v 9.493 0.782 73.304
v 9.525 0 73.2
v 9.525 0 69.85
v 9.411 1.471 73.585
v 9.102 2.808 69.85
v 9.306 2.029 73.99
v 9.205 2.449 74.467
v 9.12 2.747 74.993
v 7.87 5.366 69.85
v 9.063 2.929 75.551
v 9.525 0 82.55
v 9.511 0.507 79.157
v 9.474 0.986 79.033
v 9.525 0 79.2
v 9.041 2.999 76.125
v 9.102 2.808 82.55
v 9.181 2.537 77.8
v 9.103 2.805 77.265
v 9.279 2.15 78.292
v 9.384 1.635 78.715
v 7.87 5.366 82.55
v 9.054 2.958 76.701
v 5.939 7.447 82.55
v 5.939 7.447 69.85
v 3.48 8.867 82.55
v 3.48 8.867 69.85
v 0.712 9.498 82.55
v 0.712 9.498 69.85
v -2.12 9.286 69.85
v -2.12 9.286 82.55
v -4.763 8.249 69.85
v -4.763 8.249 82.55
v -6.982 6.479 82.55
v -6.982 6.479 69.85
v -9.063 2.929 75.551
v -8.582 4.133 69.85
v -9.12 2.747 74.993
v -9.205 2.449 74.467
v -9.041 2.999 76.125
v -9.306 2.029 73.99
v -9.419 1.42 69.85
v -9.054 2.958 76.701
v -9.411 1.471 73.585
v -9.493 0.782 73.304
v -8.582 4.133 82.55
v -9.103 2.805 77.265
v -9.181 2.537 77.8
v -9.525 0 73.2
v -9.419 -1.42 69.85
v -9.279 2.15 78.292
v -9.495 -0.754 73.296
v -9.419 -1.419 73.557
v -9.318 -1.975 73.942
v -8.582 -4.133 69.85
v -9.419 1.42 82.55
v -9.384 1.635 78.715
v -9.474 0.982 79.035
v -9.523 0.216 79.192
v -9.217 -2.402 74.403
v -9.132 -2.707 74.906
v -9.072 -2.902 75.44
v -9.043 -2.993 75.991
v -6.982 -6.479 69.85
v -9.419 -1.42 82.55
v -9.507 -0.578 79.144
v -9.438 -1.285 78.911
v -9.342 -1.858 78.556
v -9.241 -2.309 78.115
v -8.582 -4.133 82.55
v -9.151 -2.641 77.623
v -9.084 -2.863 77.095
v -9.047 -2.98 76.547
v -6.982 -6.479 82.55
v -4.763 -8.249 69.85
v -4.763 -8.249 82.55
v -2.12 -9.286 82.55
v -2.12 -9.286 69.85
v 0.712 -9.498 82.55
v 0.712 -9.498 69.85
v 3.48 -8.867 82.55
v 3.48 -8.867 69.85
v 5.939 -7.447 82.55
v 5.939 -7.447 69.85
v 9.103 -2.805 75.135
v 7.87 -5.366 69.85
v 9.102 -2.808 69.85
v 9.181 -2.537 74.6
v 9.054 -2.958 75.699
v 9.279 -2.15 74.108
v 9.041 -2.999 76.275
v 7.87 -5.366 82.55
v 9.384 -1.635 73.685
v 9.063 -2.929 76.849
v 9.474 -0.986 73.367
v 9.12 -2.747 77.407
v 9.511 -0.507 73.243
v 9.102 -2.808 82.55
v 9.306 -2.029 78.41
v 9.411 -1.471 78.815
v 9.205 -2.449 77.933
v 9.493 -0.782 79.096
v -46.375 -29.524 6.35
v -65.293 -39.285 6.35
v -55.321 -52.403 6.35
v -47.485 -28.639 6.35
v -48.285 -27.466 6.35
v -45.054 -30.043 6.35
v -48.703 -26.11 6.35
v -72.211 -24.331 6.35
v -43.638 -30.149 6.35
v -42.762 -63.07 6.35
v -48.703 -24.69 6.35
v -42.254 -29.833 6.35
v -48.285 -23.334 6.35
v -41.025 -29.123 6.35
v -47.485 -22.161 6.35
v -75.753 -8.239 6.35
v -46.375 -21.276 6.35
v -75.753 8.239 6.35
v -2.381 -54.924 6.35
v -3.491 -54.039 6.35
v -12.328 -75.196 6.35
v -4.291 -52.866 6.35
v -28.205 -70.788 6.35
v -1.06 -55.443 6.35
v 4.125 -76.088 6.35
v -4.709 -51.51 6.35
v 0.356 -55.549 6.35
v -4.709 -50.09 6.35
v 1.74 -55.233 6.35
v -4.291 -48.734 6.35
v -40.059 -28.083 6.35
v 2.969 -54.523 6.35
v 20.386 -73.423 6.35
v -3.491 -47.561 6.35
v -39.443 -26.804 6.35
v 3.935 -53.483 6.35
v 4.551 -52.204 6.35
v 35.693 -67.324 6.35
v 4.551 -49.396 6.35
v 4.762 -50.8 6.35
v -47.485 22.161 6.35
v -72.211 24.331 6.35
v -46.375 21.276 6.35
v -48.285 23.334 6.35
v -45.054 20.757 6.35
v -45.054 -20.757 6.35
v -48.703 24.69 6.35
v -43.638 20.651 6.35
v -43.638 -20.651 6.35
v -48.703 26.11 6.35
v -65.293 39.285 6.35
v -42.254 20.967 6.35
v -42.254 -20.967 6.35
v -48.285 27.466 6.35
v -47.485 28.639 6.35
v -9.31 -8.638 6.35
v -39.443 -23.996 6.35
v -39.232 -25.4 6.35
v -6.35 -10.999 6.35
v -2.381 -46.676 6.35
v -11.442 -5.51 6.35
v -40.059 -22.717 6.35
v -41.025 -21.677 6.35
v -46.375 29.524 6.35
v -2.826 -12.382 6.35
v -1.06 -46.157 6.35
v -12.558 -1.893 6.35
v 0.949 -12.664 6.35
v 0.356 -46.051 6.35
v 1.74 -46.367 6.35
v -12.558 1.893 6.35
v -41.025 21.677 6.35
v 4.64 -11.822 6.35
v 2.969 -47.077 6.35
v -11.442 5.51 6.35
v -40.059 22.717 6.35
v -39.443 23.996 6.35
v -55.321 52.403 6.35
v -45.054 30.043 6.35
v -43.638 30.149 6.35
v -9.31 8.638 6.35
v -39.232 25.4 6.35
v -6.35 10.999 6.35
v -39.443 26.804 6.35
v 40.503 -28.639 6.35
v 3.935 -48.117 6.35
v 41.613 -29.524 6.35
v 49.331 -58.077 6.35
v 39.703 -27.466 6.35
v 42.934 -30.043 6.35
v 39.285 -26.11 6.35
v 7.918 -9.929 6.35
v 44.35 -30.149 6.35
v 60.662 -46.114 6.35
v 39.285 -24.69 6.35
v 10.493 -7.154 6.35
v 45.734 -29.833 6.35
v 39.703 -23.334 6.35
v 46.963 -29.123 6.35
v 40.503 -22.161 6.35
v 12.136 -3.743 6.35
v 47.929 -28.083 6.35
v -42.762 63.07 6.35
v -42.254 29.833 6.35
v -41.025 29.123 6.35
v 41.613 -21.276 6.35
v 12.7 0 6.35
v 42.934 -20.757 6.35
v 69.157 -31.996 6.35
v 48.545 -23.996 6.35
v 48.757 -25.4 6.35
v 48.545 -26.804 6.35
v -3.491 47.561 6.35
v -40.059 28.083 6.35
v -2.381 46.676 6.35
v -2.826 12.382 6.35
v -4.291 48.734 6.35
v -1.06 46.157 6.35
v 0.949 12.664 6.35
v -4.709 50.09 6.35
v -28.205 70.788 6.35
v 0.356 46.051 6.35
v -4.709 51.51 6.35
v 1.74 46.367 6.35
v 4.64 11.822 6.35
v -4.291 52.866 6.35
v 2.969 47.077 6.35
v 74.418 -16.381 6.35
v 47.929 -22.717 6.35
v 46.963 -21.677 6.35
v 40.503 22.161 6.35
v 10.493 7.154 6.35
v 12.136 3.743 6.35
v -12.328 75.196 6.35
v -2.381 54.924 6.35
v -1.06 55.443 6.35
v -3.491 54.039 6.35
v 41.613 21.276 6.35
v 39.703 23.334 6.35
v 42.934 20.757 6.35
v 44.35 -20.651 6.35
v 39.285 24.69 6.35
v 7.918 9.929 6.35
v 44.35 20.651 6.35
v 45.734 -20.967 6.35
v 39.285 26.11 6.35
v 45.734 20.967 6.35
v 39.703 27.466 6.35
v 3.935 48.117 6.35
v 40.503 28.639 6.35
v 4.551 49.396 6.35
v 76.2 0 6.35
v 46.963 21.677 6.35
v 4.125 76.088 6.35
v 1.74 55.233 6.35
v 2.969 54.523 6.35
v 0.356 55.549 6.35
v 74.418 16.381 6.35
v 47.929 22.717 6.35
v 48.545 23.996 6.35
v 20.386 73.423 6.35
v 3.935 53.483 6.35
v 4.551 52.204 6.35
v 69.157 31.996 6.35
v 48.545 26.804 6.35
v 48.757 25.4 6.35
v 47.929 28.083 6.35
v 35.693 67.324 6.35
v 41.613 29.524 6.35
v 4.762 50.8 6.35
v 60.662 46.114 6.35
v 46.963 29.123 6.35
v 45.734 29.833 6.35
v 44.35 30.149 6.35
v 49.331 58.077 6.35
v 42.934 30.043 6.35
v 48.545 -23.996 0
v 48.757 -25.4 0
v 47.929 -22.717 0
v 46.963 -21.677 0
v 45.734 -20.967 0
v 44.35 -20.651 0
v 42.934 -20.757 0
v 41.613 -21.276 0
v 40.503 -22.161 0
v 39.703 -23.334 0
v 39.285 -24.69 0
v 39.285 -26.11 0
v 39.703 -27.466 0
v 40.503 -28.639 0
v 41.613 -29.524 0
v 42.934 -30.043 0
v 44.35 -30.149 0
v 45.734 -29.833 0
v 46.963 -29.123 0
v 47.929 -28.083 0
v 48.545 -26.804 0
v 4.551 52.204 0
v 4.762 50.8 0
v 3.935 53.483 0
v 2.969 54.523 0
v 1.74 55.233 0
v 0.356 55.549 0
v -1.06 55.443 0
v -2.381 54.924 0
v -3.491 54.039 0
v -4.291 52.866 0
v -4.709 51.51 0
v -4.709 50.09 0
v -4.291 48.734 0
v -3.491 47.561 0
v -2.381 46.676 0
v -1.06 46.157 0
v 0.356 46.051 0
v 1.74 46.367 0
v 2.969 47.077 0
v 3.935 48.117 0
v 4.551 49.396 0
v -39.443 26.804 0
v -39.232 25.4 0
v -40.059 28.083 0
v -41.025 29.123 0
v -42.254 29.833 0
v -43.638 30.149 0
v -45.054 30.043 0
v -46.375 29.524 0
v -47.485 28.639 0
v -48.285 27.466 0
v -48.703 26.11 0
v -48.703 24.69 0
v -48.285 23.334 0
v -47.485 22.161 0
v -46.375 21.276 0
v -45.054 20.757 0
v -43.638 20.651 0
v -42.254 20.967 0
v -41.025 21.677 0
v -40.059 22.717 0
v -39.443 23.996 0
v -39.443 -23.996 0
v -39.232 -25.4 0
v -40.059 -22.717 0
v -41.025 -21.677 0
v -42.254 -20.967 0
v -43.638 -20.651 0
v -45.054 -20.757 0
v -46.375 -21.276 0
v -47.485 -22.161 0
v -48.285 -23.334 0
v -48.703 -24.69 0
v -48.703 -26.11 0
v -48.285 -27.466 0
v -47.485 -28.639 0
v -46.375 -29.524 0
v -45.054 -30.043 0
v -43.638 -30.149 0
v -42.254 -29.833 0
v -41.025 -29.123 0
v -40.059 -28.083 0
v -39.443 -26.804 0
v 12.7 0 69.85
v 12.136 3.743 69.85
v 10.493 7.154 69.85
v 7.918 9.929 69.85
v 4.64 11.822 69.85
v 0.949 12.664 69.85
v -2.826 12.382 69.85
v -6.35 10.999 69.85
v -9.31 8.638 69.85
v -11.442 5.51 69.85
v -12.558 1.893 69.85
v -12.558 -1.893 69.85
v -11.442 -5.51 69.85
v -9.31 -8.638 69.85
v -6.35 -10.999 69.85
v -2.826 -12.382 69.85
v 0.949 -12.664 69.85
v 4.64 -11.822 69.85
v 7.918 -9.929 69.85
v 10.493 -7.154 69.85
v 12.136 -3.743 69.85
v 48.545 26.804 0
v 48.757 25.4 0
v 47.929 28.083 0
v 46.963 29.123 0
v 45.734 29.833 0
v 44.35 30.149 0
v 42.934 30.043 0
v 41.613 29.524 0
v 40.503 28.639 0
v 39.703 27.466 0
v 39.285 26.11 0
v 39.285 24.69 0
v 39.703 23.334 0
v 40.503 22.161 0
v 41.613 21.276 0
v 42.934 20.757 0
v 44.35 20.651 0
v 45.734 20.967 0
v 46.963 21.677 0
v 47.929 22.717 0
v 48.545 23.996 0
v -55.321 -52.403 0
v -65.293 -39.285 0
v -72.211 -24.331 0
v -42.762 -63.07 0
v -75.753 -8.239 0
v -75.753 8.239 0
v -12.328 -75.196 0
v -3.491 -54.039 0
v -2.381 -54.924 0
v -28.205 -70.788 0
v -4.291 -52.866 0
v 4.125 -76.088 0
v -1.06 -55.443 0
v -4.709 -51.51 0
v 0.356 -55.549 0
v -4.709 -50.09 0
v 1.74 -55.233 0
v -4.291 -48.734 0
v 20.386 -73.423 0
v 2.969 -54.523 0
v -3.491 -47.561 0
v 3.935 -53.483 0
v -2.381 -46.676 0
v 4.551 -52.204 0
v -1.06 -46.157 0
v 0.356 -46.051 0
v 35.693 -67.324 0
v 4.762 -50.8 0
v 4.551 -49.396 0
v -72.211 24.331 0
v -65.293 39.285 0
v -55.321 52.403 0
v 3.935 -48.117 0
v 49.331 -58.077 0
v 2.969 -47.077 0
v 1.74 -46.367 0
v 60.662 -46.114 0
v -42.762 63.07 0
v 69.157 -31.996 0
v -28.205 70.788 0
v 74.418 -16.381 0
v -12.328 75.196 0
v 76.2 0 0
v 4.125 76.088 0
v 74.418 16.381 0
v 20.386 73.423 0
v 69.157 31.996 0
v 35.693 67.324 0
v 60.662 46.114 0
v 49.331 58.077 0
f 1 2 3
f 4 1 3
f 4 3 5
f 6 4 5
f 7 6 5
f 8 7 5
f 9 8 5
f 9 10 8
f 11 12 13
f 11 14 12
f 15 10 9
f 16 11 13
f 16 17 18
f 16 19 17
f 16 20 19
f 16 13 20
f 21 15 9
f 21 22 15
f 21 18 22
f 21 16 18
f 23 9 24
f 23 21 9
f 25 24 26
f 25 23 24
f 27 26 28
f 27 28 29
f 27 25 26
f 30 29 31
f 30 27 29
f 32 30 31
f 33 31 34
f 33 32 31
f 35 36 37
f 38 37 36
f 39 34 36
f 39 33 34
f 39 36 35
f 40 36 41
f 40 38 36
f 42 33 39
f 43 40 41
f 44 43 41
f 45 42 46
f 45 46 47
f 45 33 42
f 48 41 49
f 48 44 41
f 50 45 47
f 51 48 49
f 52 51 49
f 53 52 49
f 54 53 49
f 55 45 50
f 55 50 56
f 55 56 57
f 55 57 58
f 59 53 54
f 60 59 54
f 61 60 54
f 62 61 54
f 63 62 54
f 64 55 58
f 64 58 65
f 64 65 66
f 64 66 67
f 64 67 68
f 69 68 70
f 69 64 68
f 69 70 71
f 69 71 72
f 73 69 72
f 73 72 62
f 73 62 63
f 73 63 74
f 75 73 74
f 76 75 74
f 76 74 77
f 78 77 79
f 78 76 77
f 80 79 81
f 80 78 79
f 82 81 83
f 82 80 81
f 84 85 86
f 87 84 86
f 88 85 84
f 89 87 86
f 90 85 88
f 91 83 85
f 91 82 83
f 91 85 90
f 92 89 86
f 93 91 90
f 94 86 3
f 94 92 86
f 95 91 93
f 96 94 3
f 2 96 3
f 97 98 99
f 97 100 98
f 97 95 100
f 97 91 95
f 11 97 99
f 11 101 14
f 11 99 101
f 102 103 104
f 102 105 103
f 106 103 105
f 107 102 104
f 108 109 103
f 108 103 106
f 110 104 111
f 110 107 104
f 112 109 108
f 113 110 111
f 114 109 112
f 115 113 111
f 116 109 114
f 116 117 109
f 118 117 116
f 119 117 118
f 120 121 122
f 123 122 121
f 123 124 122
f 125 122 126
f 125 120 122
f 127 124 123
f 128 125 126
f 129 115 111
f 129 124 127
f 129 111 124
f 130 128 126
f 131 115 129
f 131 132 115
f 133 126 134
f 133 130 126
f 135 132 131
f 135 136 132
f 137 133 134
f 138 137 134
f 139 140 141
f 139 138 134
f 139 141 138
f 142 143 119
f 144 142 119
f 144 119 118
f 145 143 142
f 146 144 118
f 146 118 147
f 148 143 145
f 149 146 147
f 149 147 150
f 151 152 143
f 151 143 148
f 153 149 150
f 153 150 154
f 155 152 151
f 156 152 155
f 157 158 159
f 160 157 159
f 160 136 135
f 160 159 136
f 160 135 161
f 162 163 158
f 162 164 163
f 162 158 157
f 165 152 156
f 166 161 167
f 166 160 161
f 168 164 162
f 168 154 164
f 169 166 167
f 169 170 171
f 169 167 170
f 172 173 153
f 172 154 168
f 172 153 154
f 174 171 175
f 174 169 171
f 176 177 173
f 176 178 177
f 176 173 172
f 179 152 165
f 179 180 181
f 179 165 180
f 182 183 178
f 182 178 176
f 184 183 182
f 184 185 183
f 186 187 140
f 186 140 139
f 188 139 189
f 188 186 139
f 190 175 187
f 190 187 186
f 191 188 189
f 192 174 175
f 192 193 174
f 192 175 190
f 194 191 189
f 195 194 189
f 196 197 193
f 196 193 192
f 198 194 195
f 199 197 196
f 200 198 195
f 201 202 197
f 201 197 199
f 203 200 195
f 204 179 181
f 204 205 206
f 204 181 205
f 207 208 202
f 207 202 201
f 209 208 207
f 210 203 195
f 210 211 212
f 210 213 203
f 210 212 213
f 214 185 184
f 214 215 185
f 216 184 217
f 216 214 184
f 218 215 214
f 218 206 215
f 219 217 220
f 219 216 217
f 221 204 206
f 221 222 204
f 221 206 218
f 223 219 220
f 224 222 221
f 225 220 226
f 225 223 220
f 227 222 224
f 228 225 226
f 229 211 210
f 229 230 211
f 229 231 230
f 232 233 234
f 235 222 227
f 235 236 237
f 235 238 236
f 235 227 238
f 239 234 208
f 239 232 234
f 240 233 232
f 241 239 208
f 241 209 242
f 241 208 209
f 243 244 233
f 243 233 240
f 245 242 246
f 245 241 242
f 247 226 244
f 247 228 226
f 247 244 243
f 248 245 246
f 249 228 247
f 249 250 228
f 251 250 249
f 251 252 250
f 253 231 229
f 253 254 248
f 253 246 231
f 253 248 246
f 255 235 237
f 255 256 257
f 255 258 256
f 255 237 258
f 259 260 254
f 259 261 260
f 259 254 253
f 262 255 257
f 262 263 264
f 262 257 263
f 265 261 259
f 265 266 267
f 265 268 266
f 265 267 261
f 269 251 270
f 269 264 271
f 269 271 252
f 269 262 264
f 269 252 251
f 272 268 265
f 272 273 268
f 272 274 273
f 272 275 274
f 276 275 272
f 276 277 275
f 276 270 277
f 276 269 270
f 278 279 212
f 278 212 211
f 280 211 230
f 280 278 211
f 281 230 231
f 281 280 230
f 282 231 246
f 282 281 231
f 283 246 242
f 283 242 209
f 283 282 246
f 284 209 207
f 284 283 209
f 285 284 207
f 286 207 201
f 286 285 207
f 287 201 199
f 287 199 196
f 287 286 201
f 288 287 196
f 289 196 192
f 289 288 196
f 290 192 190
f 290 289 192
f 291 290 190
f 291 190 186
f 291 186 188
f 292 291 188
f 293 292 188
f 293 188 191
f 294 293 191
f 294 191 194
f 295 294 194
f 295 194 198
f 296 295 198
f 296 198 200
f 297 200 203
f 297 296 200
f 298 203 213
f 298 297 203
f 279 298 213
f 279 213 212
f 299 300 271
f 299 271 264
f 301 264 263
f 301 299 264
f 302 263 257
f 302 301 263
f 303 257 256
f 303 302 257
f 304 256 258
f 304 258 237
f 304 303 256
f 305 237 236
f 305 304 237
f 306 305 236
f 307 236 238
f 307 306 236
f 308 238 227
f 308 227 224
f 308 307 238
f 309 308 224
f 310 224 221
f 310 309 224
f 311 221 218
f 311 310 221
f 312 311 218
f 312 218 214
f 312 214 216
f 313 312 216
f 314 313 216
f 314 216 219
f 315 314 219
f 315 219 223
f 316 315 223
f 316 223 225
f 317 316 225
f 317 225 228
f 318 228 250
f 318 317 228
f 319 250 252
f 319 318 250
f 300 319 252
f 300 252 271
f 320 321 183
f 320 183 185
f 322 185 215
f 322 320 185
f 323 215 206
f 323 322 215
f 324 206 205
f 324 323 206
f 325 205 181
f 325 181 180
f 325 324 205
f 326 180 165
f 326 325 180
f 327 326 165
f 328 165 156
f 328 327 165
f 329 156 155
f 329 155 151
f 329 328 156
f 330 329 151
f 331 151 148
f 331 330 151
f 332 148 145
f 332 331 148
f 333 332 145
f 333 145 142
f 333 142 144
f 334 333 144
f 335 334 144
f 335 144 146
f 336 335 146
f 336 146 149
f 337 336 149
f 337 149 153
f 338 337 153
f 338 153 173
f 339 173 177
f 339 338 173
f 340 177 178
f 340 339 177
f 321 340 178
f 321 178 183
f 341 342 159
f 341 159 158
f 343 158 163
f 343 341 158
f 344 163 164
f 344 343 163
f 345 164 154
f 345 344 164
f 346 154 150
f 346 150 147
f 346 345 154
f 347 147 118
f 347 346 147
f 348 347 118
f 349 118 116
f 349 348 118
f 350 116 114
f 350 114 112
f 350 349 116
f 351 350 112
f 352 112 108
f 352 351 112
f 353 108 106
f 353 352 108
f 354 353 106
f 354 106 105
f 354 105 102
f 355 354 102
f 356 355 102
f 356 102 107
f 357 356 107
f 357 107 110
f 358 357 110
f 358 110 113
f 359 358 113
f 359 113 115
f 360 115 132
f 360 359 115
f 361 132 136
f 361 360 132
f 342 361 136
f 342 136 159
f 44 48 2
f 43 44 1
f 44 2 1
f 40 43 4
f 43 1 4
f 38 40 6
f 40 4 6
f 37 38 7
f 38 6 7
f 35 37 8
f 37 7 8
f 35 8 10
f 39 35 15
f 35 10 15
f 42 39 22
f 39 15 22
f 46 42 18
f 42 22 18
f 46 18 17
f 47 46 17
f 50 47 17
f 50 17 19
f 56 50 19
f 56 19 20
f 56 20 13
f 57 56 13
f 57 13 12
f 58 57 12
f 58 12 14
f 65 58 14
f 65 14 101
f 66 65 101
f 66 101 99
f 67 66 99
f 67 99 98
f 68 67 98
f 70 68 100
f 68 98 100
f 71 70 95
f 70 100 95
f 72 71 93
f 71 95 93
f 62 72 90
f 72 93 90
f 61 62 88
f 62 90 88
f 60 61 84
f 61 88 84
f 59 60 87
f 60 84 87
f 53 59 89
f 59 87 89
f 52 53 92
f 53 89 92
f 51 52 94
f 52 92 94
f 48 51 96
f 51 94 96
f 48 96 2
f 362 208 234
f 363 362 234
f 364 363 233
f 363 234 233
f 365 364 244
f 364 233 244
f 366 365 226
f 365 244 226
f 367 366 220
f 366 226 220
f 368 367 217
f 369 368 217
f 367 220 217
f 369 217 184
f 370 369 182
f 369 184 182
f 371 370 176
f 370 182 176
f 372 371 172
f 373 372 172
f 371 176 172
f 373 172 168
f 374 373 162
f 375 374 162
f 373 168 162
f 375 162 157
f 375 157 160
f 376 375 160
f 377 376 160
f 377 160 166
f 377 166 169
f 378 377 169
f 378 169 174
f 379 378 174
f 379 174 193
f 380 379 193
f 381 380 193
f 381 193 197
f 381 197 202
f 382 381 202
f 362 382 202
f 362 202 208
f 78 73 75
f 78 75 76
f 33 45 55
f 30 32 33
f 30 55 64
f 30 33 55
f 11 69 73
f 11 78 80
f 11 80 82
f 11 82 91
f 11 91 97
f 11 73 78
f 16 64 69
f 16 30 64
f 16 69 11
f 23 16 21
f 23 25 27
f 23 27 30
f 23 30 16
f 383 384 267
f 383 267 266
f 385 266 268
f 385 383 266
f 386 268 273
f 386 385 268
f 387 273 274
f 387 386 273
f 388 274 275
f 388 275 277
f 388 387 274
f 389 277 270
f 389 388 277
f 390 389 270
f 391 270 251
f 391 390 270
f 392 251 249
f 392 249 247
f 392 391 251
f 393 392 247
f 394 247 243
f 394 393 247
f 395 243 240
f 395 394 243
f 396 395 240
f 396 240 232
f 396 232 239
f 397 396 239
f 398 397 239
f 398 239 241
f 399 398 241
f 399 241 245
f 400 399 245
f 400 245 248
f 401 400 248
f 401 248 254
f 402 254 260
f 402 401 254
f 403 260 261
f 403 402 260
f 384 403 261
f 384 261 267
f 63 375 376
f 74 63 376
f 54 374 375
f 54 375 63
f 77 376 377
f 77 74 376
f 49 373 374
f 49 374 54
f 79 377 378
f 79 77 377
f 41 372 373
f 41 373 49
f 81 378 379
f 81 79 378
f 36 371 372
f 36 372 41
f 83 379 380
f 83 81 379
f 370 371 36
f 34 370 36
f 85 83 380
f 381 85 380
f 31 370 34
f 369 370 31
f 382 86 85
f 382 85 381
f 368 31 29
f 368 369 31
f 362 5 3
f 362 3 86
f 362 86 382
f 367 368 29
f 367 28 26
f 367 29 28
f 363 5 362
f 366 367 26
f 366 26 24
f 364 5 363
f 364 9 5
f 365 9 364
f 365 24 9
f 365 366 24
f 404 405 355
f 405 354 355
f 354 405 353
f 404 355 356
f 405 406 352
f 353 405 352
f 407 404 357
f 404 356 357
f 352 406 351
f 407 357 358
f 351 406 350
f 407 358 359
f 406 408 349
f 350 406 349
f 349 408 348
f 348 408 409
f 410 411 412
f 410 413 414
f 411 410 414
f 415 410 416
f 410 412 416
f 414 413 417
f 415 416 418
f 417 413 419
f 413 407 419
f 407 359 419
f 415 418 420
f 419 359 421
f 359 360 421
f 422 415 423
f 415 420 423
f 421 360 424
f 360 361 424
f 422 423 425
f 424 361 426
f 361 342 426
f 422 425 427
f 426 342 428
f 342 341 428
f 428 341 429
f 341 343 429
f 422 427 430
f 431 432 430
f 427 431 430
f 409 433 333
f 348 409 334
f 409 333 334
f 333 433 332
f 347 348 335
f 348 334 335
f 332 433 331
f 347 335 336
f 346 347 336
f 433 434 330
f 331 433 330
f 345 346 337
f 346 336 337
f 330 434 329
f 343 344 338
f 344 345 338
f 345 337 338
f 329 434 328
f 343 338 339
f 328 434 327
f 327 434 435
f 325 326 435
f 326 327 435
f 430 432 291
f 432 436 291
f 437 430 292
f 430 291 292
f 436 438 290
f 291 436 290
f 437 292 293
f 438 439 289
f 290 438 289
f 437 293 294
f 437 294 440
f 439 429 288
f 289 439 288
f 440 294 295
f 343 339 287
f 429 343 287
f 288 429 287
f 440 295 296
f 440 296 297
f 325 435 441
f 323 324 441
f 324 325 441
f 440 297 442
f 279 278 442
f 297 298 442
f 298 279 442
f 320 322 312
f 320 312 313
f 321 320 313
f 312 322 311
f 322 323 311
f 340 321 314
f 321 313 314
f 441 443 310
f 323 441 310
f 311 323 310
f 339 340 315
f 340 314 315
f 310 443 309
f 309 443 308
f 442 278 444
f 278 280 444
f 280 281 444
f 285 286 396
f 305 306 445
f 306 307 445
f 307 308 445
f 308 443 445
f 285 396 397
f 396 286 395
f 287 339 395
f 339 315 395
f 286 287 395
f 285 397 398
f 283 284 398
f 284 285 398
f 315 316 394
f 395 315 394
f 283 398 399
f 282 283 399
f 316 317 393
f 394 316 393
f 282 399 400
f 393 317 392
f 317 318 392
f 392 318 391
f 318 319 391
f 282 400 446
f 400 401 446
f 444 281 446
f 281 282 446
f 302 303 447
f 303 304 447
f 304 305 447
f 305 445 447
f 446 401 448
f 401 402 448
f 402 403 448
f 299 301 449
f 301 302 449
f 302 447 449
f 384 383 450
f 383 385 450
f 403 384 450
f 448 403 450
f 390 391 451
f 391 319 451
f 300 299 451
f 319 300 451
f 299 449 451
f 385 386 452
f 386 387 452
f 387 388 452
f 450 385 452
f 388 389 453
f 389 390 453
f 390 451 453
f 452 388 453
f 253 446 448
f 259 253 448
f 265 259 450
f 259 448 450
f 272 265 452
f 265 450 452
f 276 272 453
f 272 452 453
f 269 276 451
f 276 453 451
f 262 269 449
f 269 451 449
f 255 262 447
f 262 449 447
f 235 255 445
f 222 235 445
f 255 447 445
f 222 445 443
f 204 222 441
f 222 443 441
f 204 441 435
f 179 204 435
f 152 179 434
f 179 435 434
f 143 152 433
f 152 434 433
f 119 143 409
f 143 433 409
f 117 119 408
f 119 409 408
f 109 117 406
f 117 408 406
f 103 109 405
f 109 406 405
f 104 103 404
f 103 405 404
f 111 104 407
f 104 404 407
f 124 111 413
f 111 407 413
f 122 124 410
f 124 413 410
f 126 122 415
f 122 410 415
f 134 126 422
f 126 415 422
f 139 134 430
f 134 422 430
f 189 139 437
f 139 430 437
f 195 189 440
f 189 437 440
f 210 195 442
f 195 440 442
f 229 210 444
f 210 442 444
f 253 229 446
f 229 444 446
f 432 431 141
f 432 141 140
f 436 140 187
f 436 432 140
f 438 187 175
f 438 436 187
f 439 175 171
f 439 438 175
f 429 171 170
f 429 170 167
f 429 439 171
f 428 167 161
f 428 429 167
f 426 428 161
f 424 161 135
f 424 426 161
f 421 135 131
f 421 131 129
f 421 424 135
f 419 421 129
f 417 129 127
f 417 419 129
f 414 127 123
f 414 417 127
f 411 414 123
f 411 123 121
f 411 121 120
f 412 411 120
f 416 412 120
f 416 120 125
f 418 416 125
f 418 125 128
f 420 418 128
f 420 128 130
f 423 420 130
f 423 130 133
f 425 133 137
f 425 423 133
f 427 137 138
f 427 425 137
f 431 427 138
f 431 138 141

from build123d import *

# Parameters (mm, degrees)
SKETCH1_R           = 76.2
SKETCH1_R_2         = 4.7625
BOSS_EXTRUDE1_DEPTH = 6.35
SKETCH2_R           = 12.7
BOSS_EXTRUDE2_DEPTH = 76.2
SKETCH3_R           = 12.7
SKETCH3_R_2         = 9.525
CUT_EXTRUDE1_DEPTH  = 12.7
SKETCH4_R           = 3
CUT_EXTRUDE2_DEPTH  = 86.725


with BuildPart() as part:
    # Sketch1 → Boss-Extrude1 (new body)
    with BuildSketch(Plane.XY):
        Circle(SKETCH1_R)
        with Locations((0, 50.8)):
            Circle(SKETCH1_R_2, mode=Mode.SUBTRACT)
        with Locations((43.994090512, 25.4)):
            Circle(SKETCH1_R_2, mode=Mode.SUBTRACT)
        with Locations((43.994090512, -25.4)):
            Circle(SKETCH1_R_2, mode=Mode.SUBTRACT)
        with Locations((0, -50.8)):
            Circle(SKETCH1_R_2, mode=Mode.SUBTRACT)
        with Locations((-43.994090512, -25.4)):
            Circle(SKETCH1_R_2, mode=Mode.SUBTRACT)
        with Locations((-43.994090512, 25.4)):
            Circle(SKETCH1_R_2, mode=Mode.SUBTRACT)
    extrude(amount=BOSS_EXTRUDE1_DEPTH)

    # Sketch2 → Boss-Extrude2 (add)
    with BuildSketch(Plane.XY.offset(6.35)):
        Circle(SKETCH2_R)
    extrude(amount=BOSS_EXTRUDE2_DEPTH)

    # Sketch3 → Cut-Extrude1 (cut)
    with BuildSketch(Plane.XY.offset(82.55)):
        Circle(SKETCH3_R)
        Circle(SKETCH3_R_2, mode=Mode.SUBTRACT)
    extrude(amount=-CUT_EXTRUDE1_DEPTH, mode=Mode.SUBTRACT)

    # Sketch4 → Cut-Extrude2 (cut, through all)
    with BuildSketch(Plane(origin=(9.525, 0, 0), x_dir=(0, 0, -1), z_dir=(1, 0, 0))):
        with Locations((-76.2, 0)):
            Circle(SKETCH4_R)
    extrude(amount=-CUT_EXTRUDE2_DEPTH, mode=Mode.SUBTRACT)


solid = part.part
